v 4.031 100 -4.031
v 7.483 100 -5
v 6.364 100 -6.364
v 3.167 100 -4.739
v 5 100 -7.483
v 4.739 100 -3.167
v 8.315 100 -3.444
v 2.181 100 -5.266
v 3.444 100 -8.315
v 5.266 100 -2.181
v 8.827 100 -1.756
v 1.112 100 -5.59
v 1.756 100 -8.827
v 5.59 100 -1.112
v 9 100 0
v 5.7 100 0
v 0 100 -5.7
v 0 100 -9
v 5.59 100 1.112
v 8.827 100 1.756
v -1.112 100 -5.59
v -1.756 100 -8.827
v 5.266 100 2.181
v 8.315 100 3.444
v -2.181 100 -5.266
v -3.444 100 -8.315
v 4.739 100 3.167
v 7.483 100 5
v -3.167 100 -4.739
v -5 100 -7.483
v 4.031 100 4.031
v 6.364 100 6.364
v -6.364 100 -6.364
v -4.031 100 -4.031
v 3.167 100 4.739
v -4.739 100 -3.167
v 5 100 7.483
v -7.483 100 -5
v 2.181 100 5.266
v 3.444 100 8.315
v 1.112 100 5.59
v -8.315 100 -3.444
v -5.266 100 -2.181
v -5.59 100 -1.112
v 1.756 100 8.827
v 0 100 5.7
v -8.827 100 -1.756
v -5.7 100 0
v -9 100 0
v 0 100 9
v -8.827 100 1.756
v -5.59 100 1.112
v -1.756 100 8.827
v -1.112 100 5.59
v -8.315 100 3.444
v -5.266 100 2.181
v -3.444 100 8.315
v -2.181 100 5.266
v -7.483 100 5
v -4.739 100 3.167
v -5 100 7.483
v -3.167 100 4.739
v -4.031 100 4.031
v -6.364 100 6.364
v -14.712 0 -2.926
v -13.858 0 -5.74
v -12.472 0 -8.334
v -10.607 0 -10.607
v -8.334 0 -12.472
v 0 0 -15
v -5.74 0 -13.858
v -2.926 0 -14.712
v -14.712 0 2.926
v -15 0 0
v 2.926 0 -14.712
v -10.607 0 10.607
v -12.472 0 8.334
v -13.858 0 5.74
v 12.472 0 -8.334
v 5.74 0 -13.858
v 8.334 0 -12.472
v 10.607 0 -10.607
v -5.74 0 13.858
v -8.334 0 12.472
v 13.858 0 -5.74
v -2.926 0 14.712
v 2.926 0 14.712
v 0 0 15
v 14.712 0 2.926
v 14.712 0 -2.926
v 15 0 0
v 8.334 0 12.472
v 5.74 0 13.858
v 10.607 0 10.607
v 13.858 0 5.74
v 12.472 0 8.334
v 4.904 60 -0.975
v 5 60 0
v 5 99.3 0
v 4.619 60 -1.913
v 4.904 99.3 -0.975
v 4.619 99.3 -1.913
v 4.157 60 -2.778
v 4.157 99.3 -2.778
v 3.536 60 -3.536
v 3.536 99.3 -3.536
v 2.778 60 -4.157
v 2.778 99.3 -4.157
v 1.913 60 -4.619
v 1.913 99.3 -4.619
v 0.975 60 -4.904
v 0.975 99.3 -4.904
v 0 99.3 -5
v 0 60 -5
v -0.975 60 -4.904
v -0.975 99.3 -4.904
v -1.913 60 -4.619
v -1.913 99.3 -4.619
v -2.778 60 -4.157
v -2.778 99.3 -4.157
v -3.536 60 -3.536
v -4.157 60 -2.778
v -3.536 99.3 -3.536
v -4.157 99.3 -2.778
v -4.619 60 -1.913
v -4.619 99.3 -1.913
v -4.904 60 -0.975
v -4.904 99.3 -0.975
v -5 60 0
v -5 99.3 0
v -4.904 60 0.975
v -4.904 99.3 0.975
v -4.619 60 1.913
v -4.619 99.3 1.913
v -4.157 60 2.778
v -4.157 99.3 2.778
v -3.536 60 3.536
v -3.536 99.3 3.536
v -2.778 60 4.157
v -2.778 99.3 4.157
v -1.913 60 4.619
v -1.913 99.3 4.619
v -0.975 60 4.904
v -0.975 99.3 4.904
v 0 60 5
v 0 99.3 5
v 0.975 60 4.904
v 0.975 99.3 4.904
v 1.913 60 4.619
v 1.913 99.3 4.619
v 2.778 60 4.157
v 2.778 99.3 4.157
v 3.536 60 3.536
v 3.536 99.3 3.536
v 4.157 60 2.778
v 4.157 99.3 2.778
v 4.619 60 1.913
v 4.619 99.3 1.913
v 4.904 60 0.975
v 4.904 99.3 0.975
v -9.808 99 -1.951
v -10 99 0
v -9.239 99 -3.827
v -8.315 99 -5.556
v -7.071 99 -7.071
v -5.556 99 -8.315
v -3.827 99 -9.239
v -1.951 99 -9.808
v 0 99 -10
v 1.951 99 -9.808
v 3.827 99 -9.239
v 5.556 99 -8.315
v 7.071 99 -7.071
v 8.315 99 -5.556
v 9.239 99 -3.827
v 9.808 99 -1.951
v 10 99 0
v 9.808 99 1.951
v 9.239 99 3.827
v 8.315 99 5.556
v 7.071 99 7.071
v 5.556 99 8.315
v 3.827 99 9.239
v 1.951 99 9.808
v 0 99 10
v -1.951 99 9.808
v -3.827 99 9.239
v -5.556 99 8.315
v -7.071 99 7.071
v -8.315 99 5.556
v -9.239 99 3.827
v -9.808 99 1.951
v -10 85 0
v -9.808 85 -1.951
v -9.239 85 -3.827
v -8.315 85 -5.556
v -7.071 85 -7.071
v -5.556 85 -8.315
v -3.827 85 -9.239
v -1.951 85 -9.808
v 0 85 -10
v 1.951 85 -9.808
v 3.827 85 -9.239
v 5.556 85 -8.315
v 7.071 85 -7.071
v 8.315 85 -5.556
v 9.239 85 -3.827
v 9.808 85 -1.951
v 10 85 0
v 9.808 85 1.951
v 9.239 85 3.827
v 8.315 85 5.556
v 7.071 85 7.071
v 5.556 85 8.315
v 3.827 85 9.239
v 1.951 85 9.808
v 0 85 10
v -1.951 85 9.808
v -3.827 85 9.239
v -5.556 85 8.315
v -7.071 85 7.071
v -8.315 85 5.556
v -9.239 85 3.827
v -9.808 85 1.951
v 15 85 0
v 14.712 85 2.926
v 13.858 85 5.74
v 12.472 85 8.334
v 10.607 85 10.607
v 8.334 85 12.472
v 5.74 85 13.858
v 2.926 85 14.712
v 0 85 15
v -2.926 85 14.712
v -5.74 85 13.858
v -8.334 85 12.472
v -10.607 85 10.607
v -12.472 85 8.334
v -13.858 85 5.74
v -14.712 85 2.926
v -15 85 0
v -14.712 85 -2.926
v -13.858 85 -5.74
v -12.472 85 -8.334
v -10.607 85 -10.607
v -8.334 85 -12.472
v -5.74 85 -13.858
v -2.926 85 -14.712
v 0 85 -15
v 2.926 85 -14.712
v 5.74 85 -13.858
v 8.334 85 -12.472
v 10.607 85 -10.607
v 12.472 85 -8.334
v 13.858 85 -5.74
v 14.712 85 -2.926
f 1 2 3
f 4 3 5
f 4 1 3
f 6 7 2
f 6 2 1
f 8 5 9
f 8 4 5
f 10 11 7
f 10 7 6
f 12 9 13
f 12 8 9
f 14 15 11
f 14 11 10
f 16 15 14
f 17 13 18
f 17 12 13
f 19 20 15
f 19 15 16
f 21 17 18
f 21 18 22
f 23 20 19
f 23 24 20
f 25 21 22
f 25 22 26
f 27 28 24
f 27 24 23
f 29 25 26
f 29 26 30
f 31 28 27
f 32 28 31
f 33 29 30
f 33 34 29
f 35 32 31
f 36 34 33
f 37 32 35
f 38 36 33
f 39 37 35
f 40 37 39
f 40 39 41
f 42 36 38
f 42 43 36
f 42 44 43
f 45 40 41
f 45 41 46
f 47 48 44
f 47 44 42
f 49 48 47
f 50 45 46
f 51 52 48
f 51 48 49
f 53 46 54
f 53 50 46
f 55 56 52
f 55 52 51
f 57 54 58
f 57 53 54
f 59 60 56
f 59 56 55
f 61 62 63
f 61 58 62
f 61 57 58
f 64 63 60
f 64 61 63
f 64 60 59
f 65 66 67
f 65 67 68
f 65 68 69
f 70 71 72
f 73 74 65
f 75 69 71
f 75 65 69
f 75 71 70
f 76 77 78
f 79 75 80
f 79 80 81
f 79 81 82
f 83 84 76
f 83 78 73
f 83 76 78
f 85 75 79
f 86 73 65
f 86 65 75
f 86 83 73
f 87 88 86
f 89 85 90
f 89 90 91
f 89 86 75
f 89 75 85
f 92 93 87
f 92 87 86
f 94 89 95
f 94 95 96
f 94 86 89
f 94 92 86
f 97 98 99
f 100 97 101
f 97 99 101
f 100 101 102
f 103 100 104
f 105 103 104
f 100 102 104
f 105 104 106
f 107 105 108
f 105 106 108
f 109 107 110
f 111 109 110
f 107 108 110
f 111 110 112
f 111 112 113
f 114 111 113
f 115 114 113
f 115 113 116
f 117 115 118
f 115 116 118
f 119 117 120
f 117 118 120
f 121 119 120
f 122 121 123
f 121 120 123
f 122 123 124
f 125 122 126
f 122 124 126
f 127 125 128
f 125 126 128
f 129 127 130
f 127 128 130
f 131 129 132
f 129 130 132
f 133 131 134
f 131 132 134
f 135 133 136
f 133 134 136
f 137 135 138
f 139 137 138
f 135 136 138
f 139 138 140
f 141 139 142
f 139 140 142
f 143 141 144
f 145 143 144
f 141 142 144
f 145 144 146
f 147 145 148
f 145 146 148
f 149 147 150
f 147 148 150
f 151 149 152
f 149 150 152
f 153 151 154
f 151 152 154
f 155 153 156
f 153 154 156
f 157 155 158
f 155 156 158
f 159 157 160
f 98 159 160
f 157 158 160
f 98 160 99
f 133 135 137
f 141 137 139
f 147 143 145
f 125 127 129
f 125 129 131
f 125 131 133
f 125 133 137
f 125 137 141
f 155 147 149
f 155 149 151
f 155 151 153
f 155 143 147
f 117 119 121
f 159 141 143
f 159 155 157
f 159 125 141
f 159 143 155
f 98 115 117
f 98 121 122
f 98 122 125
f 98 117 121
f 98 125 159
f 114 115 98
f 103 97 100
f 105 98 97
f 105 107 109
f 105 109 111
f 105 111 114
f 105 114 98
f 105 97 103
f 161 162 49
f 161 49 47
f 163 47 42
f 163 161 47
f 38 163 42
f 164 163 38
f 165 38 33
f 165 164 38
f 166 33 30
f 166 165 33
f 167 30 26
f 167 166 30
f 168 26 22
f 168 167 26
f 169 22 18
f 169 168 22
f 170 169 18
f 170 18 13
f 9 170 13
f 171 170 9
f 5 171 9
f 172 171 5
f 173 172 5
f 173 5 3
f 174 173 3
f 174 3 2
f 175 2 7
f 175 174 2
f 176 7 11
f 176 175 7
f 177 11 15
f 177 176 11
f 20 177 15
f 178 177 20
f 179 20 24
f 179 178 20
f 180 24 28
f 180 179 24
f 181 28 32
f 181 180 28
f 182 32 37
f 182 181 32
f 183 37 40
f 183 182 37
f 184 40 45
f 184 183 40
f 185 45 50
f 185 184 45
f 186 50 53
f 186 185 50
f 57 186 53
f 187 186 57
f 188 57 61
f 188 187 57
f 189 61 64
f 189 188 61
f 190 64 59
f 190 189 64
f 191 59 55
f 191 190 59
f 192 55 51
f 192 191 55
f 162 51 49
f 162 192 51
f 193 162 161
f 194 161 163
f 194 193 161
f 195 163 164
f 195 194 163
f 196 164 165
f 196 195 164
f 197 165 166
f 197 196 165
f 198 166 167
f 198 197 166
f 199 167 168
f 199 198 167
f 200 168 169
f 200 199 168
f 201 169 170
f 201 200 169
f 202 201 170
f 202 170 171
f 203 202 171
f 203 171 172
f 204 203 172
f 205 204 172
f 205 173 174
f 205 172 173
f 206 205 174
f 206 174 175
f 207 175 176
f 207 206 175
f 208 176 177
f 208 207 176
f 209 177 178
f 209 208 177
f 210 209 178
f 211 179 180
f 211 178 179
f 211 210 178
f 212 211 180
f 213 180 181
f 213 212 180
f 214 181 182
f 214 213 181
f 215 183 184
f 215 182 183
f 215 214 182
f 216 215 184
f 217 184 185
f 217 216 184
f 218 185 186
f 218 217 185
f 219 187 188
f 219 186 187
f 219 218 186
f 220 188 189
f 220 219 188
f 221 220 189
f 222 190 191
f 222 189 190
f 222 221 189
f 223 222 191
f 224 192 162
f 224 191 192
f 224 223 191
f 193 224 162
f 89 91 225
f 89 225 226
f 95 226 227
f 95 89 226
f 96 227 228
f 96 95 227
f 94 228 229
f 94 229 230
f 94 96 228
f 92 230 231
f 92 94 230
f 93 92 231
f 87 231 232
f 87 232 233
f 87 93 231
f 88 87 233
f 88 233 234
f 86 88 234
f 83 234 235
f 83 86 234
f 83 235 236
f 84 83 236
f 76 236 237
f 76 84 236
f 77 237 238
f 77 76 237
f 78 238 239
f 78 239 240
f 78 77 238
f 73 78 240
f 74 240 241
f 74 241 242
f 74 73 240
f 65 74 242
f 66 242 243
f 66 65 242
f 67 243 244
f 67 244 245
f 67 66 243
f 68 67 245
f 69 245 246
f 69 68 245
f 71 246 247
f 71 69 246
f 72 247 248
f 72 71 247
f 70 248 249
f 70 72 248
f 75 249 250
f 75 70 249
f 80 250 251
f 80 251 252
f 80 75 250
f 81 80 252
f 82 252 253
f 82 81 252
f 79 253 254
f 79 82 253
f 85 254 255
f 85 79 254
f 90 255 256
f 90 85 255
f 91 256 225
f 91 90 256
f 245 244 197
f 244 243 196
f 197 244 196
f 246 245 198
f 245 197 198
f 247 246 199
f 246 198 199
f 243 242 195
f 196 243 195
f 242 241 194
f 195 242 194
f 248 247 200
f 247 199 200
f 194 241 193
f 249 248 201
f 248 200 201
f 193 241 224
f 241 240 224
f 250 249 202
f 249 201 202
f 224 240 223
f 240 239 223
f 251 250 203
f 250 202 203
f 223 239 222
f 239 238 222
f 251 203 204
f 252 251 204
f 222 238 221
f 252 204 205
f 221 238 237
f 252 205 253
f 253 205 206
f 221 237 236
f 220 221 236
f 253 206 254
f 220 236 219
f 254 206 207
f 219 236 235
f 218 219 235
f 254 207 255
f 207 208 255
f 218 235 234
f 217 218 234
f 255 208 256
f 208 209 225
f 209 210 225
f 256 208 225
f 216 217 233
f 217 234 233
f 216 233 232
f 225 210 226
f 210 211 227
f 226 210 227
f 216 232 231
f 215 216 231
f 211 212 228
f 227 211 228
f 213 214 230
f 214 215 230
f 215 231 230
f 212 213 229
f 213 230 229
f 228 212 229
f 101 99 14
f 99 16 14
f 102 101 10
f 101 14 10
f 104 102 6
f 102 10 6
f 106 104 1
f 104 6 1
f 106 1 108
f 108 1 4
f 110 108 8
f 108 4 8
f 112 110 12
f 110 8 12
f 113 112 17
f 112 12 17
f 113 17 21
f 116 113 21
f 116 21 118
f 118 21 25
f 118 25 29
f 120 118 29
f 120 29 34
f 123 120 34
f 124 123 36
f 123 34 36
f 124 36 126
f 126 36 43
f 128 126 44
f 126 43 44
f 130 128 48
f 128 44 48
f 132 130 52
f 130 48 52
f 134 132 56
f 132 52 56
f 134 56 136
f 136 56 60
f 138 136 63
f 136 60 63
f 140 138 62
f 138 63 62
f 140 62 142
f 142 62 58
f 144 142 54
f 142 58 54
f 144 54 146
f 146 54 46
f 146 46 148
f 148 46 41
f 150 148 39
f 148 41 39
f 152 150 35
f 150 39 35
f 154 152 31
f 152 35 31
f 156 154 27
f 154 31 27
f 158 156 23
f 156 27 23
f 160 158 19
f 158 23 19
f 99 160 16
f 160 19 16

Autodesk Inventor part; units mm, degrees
ref_plane "YZ Plane" through (0, 0, 0) normal (1, 0, 0) x (0, 1, 0)
ref_plane "XZ Plane" through (0, 0, 0) normal (0, 1, 0) x (-1, 0, 0)
ref_plane "XY Plane" through (0, 0, 0) normal (0, 0, 1) x (1, 0, 0)
sketch "Sketch1" plane through (0, 0, 0) normal (0, 1, 0) x (-1, 0, 0)
  circle A0 centre (0, 0) radius 10
  dimension "d0" = 20
extrude "Extrusion1" add sketch "Sketch1" along normal blind 100
sketch "Sketch2" plane through (0, 100, 0) normal (0, 1, 0) x (1, 0, 0)
  circle A0 centre (0, 0) radius 5
  dimension "d3" = 10
extrude "Extrusion2" cut sketch "Sketch2" against normal blind 30
thread "Thread1" size "M10x1.5" class "6H" standard "ANSI Metric M Profile" full length
chamfer "Chamfer1" distance 1 angle 45 1 edges at (10, 100, 0)
chamfer "Chamfer2" distance 0.7 angle 45 1 edges at (-5, 100, 0)
sketch "Sketch8" plane through (0, 0, 0) normal (0, -1, 0) x (1, 0, 0)
  circle A0 centre (0, 0) radius 15
  dimension "d49" = 30
extrude "Extrusion3" add sketch "Sketch8" against normal blind 85
sketch "Sketch9" plane through (0, 85, 0) normal (0, 1, 0) x (1, 0, 0)
  circle A0 centre (0, 0) radius 5 projected
extrude "Extrusion4" cut sketch "Sketch9" against normal blind 25
sketch "Sketch3" plane through (0, 70, 0) normal (0, 1, 0) x (1, 0, 0)
  point P0 (0, 0)
sketch "Sketch4" plane through (0, 70, 0) normal (0, 1, 0) x (1, 0, 0)
  point P0 (0, 0)
sketch "Sketch5" plane through (0, 70, 0) normal (0, 1, 0) x (1, 0, 0)
  point P0 (0, 0)
sketch "Sketch6" plane through (0, 70, 0) normal (0, 1, 0) x (1, 0, 0)
  point P0 (0, 0)
sketch "Sketch7" plane through (0, 70, 0) normal (0, 1, 0) x (1, 0, 0)
  point P0 (0, 0)
properties part number "rączka_korby" material "ABS Plastic"
